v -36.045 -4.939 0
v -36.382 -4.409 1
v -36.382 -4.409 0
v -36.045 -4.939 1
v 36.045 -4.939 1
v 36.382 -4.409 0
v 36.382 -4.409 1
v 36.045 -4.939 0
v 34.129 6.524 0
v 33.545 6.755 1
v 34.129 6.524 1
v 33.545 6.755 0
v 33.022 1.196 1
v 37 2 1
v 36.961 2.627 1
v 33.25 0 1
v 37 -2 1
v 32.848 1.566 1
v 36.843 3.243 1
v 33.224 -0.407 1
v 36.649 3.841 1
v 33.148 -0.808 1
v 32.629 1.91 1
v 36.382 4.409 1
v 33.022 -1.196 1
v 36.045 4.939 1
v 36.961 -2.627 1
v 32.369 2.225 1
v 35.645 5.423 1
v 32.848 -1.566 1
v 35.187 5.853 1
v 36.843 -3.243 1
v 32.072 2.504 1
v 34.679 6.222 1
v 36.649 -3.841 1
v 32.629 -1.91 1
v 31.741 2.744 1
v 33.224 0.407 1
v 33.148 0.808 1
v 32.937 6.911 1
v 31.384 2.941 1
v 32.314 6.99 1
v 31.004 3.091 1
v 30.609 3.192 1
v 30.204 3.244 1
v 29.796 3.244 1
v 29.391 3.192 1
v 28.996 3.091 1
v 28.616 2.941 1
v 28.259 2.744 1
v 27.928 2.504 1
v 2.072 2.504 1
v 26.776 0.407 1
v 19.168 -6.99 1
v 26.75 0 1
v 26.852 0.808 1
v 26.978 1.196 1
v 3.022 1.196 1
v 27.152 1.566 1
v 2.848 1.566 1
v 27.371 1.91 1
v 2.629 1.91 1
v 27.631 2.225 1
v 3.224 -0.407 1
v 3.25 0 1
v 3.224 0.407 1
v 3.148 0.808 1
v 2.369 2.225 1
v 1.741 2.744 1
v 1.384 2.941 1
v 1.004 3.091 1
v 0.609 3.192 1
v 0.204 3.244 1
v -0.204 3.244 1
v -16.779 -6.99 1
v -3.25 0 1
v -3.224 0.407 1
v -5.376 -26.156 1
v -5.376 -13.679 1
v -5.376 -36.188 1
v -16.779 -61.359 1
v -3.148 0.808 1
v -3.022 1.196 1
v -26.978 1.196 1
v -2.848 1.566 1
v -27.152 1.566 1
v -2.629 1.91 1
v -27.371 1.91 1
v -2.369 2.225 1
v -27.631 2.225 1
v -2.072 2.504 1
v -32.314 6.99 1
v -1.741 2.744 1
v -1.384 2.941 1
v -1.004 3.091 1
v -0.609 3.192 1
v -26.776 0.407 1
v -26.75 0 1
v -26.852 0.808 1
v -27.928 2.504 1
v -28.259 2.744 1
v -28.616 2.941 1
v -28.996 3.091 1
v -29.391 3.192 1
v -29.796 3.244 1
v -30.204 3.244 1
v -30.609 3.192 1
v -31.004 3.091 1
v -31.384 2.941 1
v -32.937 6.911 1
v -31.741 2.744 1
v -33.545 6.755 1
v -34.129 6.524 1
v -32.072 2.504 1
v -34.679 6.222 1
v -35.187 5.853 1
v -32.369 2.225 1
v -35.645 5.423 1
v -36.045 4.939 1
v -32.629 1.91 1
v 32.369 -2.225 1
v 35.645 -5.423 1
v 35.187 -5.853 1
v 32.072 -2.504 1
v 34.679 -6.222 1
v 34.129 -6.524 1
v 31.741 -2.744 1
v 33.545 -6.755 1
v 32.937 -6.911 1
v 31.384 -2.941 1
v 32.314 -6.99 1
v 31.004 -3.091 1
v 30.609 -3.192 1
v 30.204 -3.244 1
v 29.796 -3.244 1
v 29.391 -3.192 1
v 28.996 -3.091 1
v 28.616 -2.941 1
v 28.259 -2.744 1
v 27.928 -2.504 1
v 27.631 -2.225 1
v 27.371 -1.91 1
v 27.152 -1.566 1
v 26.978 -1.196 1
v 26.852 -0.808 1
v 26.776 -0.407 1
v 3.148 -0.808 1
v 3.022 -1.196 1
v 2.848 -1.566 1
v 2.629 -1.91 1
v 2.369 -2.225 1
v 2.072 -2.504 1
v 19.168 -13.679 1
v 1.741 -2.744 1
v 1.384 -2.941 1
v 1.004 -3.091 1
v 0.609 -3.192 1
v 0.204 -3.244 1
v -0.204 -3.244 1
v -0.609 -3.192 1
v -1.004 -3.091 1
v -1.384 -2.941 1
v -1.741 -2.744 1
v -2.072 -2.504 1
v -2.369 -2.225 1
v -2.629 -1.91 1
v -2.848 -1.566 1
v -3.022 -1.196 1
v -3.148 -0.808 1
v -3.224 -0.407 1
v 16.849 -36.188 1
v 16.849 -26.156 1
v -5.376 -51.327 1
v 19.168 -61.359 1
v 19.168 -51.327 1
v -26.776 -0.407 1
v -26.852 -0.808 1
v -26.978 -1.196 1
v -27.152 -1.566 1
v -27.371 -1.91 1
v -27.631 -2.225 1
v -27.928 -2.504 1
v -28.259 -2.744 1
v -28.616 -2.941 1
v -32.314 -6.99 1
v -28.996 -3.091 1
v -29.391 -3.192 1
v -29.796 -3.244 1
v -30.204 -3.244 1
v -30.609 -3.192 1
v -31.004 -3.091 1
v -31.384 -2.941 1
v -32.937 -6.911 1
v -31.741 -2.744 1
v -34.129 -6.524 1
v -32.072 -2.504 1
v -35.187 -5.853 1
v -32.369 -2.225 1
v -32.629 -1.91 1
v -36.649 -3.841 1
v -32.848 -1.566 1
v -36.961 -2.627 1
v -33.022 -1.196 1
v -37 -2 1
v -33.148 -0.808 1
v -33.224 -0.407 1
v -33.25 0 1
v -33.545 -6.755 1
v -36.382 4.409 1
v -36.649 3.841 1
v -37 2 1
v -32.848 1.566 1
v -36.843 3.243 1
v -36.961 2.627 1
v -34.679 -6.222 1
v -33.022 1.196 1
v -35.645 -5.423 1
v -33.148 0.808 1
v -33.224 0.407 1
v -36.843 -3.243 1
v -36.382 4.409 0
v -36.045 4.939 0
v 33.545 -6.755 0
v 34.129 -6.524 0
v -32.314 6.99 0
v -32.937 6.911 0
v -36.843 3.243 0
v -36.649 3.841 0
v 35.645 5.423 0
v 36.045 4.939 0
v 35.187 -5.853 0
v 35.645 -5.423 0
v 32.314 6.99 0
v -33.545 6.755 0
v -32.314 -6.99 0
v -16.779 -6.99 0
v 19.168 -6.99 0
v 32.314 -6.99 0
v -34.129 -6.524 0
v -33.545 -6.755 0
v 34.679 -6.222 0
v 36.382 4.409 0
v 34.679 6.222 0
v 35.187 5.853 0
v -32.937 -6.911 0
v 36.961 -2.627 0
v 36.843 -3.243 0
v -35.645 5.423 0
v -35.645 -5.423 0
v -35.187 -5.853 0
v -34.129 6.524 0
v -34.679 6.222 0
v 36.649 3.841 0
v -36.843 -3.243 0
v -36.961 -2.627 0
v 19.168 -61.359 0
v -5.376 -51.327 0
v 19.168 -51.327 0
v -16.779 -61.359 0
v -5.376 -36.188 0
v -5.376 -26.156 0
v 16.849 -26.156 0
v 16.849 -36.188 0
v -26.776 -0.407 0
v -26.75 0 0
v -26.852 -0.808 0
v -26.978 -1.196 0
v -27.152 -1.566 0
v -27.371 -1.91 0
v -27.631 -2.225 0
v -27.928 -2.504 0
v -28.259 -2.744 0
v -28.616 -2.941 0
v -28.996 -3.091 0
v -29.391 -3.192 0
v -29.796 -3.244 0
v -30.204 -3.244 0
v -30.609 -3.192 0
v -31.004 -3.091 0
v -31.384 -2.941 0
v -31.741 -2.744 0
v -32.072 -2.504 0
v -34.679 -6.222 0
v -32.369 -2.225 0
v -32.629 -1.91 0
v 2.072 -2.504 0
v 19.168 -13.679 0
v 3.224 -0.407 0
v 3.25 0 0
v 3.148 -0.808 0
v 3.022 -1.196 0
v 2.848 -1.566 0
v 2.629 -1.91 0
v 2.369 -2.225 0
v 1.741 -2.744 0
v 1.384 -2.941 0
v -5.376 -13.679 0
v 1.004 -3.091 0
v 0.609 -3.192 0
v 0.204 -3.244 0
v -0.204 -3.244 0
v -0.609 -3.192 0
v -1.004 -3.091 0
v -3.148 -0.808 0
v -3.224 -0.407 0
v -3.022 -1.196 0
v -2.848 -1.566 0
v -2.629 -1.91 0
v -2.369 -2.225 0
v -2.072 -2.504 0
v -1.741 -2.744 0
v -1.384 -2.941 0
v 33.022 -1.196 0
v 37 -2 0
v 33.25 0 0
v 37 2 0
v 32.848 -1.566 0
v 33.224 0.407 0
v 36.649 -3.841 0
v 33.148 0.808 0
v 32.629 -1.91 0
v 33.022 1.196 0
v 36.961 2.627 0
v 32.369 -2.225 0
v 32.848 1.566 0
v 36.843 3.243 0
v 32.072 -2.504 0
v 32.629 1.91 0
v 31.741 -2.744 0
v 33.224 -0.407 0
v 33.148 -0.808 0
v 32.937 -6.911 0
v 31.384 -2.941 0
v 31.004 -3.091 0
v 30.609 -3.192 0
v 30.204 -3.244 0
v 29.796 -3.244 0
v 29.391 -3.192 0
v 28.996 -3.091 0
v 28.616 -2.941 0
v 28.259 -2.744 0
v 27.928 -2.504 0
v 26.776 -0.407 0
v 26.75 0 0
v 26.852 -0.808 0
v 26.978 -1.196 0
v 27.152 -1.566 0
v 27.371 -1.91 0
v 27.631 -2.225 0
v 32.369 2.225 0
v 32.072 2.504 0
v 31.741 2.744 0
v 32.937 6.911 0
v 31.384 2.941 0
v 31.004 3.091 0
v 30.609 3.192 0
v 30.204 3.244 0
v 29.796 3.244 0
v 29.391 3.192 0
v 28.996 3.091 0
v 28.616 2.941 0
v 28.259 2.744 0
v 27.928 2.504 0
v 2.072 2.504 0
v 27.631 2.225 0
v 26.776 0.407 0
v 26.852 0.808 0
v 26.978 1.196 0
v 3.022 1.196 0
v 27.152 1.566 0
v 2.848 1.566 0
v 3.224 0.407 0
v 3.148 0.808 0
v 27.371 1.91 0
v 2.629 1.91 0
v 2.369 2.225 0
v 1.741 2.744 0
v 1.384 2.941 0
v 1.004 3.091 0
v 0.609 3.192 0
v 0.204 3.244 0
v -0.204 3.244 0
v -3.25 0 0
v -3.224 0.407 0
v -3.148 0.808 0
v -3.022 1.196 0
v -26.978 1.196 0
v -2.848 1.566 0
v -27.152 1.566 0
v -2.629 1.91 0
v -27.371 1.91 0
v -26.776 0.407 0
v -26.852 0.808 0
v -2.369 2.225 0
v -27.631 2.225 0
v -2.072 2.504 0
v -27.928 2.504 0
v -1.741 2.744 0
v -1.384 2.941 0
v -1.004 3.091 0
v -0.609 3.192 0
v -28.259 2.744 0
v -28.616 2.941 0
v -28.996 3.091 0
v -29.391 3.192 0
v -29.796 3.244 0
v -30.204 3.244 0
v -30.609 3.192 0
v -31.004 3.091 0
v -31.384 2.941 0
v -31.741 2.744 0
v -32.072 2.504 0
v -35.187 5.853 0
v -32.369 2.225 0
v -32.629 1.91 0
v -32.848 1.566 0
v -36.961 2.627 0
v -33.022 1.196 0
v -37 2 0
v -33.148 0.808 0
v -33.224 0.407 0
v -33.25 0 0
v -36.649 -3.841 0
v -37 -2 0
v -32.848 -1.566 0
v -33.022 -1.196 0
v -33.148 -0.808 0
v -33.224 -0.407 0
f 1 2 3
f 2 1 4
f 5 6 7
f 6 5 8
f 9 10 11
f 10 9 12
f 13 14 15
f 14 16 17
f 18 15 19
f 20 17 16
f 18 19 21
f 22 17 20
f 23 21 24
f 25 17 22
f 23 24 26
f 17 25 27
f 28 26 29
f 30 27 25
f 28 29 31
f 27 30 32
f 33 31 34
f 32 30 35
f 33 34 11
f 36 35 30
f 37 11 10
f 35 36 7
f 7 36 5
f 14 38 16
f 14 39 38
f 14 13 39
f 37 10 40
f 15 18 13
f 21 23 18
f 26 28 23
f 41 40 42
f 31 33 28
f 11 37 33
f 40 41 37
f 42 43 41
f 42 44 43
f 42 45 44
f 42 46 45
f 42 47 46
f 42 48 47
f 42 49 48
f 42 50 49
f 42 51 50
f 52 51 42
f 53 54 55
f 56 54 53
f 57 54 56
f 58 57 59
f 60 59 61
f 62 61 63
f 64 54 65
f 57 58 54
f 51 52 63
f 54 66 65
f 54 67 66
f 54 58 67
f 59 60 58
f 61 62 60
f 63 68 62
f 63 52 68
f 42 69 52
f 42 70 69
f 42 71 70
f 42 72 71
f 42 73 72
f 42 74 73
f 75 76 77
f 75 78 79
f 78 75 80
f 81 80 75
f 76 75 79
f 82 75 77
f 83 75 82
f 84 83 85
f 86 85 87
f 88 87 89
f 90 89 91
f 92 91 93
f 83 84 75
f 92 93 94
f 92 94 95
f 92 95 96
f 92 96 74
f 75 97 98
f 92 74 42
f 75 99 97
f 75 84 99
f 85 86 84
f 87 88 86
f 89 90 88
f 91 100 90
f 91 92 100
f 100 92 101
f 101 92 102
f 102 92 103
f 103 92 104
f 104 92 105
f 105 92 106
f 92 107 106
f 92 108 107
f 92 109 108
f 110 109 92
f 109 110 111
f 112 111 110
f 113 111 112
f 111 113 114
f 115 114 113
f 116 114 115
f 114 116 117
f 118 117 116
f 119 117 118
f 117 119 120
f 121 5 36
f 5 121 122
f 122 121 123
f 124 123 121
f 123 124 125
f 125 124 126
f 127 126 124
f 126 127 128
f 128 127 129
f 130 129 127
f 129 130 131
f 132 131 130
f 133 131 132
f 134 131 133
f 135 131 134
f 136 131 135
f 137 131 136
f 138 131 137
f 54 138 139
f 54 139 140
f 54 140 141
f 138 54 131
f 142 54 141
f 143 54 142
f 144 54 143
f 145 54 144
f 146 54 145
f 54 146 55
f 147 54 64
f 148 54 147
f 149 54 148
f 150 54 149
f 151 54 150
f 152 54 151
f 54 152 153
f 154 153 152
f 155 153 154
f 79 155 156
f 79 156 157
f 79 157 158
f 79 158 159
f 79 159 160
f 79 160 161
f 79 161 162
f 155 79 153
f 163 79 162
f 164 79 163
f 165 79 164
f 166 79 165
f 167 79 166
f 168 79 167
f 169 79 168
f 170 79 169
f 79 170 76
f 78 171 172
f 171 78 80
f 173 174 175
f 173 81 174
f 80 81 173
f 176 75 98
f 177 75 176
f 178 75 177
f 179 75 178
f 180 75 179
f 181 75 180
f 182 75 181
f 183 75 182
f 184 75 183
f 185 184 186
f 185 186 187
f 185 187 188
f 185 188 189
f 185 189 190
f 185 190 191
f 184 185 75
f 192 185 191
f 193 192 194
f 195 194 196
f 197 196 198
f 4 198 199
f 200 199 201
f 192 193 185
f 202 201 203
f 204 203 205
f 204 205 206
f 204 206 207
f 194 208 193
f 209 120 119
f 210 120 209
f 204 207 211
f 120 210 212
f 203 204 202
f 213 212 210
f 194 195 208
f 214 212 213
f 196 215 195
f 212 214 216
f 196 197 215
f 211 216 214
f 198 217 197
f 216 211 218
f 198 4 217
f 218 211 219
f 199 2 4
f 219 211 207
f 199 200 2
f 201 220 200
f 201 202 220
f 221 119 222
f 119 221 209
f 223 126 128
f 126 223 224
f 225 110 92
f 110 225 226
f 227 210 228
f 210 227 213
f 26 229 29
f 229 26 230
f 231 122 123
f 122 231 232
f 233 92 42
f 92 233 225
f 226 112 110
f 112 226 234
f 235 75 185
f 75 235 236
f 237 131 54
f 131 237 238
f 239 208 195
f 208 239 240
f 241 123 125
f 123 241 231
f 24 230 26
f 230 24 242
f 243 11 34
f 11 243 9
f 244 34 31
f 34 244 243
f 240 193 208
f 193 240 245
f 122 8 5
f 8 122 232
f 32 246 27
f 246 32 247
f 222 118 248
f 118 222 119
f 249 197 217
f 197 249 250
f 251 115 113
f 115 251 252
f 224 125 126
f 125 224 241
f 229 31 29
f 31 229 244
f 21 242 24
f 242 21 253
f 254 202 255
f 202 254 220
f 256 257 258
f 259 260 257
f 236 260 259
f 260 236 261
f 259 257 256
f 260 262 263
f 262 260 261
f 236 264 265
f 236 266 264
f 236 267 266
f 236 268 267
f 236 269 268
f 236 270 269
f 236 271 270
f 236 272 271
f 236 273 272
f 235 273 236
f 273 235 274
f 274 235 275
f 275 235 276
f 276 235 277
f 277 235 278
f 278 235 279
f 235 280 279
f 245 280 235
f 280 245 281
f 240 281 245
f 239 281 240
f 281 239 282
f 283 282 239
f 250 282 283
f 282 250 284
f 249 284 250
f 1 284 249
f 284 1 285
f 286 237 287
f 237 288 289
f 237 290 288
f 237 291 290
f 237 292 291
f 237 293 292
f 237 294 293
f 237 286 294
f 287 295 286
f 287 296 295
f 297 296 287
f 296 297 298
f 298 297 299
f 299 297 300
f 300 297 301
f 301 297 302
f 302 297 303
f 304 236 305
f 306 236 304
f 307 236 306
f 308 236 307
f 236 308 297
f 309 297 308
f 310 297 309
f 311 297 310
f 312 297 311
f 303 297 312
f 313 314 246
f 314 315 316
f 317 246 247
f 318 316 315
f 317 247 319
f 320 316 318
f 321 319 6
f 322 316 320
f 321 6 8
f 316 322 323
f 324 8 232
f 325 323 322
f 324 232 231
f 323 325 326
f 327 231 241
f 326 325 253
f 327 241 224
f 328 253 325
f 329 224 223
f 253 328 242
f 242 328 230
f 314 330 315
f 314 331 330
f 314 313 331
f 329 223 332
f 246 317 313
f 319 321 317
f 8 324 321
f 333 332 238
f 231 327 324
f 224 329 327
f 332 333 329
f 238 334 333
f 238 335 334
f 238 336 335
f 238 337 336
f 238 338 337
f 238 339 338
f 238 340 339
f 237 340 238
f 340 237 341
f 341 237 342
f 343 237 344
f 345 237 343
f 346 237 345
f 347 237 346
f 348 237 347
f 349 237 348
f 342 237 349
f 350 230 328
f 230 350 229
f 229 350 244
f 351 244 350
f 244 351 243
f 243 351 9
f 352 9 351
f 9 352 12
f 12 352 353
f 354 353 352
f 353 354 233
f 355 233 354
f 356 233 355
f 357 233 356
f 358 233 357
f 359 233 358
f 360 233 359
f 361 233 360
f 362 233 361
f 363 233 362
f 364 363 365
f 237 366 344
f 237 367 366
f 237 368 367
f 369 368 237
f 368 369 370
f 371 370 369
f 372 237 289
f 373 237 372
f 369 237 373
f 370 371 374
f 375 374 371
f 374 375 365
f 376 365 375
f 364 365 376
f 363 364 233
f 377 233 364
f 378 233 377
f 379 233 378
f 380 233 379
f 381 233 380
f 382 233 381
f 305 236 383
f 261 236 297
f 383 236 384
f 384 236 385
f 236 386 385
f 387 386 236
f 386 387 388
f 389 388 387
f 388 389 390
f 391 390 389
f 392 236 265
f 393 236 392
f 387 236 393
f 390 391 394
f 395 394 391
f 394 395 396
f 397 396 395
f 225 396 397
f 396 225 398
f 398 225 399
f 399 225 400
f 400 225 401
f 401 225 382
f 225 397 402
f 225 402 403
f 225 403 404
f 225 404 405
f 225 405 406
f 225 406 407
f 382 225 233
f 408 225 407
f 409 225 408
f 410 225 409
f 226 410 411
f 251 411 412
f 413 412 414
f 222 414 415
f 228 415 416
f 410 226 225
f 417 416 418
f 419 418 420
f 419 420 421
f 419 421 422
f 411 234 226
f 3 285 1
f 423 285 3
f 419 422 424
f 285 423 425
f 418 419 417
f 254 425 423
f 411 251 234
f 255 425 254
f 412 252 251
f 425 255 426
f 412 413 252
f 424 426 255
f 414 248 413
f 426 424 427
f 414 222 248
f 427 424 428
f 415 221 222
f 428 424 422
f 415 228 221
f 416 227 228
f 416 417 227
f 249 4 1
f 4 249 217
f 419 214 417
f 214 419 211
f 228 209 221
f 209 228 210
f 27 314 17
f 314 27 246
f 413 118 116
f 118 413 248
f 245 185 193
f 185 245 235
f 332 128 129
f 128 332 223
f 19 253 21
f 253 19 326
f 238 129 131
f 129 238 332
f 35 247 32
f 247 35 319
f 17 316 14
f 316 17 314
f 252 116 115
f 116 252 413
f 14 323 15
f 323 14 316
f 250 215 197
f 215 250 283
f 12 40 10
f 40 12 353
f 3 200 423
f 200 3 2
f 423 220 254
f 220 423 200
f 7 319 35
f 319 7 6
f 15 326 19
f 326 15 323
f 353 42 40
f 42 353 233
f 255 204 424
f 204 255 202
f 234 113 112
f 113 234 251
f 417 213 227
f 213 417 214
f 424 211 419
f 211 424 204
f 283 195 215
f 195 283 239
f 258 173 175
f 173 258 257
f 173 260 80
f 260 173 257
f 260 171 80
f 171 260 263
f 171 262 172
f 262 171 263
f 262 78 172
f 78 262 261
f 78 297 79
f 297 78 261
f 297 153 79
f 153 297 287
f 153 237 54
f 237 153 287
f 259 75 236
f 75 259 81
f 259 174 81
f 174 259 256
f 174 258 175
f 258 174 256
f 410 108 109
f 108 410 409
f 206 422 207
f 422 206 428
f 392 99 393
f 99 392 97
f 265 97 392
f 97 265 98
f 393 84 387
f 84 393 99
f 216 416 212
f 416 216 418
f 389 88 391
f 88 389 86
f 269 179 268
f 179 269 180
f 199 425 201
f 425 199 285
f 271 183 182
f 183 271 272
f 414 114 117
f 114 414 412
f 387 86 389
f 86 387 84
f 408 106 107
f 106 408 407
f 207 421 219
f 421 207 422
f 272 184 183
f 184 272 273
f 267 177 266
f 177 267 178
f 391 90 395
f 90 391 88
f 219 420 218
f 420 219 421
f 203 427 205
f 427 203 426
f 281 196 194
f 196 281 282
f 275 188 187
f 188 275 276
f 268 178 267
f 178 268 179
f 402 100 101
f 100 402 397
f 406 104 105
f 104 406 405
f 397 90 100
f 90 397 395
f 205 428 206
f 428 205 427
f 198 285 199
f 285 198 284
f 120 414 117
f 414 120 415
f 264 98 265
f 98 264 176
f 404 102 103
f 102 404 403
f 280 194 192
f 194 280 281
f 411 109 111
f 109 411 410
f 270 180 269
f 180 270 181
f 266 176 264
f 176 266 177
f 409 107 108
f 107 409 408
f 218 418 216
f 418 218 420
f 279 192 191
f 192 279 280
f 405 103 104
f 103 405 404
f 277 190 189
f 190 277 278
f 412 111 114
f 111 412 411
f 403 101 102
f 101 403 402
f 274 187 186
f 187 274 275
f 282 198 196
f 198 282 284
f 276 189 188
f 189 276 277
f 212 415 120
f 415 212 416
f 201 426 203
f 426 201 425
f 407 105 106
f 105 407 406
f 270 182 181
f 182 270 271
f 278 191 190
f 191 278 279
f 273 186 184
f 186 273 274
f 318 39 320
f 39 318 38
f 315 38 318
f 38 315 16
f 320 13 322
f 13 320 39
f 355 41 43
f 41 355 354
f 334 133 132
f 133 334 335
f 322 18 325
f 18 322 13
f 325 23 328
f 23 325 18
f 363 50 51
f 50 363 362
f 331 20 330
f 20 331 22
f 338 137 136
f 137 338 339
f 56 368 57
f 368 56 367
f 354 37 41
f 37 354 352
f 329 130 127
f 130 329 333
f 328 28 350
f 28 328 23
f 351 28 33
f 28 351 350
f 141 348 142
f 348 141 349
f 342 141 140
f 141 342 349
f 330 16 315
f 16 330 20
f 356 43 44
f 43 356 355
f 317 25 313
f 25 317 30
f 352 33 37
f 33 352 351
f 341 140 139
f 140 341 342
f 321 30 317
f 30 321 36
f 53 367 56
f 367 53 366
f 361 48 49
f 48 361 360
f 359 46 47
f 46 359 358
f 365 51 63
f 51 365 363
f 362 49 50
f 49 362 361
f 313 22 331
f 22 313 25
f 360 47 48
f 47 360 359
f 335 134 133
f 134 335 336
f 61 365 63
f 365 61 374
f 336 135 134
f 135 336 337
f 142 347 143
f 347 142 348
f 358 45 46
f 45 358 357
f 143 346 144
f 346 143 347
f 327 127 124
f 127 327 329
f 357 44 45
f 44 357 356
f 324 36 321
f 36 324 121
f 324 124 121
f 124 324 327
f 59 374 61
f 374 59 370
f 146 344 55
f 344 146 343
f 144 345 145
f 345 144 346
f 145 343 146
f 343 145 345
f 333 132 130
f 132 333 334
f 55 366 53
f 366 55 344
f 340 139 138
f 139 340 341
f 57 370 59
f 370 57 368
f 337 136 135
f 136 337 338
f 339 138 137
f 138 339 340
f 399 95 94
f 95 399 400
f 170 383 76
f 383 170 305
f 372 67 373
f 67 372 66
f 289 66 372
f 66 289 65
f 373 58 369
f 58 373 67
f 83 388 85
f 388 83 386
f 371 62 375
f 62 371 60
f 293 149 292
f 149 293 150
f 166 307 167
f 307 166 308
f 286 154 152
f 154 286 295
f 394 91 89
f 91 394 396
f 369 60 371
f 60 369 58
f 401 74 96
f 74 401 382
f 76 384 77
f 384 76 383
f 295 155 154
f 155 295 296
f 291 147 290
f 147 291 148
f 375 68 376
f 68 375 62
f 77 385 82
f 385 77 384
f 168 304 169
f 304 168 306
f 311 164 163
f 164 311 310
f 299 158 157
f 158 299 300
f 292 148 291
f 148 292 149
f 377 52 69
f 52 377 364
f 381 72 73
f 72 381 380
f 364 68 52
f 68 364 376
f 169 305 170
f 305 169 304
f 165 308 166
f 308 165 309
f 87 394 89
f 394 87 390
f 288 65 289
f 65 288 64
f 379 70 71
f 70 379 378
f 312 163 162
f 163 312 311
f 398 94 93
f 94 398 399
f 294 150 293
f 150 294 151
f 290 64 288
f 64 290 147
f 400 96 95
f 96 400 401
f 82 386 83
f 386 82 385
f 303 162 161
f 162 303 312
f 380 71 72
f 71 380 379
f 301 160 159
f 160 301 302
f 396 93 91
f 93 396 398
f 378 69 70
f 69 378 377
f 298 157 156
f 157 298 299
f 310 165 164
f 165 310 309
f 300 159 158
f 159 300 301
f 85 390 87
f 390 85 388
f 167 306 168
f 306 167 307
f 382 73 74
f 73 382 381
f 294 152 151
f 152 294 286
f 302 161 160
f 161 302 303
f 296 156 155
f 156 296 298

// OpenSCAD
$fn = 50;


difference() {
	union() {
		translate(v = [0, 0, 0]) {
			rotate(a = [0, 0, 0]) {
				hull() {
					translate(v = [-32.0000000000, 2.0000000000, 0]) {
						rotate(a = [0, 0, 0]) {
							translate(v = [0, 0, 0]) {
								rotate(a = [0, 0, 0]) {
									cylinder(h = 1, r = 5);
								}
							}
						}
					}
					translate(v = [32.0000000000, 2.0000000000, 0]) {
						rotate(a = [0, 0, 0]) {
							translate(v = [0, 0, 0]) {
								rotate(a = [0, 0, 0]) {
									cylinder(h = 1, r = 5);
								}
							}
						}
					}
					translate(v = [-32.0000000000, -2.0000000000, 0]) {
						rotate(a = [0, 0, 0]) {
							translate(v = [0, 0, 0]) {
								rotate(a = [0, 0, 0]) {
									cylinder(h = 1, r = 5);
								}
							}
						}
					}
					translate(v = [32.0000000000, -2.0000000000, 0]) {
						rotate(a = [0, 0, 0]) {
							translate(v = [0, 0, 0]) {
								rotate(a = [0, 0, 0]) {
									cylinder(h = 1, r = 5);
								}
							}
						}
					}
				}
			}
		}
		translate(v = [0, -5, 0]) {
			rotate(a = [0, 0, 0]) {
				linear_extrude(height = 1) {
					text(font = "DejaVu Sans Mono:style=Bold", halign = "center", size = 57.0000000000, text = "E", valign = "top");
				}
			}
		}
	}
	union() {
		translate(v = [-30.0000000000, 0.0000000000, -125.0000000000]) {
			rotate(a = [0, 0, 0]) {
				cylinder(h = 250, r = 3.2500000000);
			}
		}
		translate(v = [30.0000000000, 0.0000000000, -125.0000000000]) {
			rotate(a = [0, 0, 0]) {
				cylinder(h = 250, r = 3.2500000000);
			}
		}
		translate(v = [30.0000000000, 0.0000000000, -125.0000000000]) {
			rotate(a = [0, 0, 0]) {
				cylinder(h = 250, r = 3.2500000000);
			}
		}
		translate(v = [0, 0, -125.0000000000]) {
			rotate(a = [0, 0, 0]) {
				cylinder(h = 250, r = 3.2500000000);
			}
		}
	}
}
